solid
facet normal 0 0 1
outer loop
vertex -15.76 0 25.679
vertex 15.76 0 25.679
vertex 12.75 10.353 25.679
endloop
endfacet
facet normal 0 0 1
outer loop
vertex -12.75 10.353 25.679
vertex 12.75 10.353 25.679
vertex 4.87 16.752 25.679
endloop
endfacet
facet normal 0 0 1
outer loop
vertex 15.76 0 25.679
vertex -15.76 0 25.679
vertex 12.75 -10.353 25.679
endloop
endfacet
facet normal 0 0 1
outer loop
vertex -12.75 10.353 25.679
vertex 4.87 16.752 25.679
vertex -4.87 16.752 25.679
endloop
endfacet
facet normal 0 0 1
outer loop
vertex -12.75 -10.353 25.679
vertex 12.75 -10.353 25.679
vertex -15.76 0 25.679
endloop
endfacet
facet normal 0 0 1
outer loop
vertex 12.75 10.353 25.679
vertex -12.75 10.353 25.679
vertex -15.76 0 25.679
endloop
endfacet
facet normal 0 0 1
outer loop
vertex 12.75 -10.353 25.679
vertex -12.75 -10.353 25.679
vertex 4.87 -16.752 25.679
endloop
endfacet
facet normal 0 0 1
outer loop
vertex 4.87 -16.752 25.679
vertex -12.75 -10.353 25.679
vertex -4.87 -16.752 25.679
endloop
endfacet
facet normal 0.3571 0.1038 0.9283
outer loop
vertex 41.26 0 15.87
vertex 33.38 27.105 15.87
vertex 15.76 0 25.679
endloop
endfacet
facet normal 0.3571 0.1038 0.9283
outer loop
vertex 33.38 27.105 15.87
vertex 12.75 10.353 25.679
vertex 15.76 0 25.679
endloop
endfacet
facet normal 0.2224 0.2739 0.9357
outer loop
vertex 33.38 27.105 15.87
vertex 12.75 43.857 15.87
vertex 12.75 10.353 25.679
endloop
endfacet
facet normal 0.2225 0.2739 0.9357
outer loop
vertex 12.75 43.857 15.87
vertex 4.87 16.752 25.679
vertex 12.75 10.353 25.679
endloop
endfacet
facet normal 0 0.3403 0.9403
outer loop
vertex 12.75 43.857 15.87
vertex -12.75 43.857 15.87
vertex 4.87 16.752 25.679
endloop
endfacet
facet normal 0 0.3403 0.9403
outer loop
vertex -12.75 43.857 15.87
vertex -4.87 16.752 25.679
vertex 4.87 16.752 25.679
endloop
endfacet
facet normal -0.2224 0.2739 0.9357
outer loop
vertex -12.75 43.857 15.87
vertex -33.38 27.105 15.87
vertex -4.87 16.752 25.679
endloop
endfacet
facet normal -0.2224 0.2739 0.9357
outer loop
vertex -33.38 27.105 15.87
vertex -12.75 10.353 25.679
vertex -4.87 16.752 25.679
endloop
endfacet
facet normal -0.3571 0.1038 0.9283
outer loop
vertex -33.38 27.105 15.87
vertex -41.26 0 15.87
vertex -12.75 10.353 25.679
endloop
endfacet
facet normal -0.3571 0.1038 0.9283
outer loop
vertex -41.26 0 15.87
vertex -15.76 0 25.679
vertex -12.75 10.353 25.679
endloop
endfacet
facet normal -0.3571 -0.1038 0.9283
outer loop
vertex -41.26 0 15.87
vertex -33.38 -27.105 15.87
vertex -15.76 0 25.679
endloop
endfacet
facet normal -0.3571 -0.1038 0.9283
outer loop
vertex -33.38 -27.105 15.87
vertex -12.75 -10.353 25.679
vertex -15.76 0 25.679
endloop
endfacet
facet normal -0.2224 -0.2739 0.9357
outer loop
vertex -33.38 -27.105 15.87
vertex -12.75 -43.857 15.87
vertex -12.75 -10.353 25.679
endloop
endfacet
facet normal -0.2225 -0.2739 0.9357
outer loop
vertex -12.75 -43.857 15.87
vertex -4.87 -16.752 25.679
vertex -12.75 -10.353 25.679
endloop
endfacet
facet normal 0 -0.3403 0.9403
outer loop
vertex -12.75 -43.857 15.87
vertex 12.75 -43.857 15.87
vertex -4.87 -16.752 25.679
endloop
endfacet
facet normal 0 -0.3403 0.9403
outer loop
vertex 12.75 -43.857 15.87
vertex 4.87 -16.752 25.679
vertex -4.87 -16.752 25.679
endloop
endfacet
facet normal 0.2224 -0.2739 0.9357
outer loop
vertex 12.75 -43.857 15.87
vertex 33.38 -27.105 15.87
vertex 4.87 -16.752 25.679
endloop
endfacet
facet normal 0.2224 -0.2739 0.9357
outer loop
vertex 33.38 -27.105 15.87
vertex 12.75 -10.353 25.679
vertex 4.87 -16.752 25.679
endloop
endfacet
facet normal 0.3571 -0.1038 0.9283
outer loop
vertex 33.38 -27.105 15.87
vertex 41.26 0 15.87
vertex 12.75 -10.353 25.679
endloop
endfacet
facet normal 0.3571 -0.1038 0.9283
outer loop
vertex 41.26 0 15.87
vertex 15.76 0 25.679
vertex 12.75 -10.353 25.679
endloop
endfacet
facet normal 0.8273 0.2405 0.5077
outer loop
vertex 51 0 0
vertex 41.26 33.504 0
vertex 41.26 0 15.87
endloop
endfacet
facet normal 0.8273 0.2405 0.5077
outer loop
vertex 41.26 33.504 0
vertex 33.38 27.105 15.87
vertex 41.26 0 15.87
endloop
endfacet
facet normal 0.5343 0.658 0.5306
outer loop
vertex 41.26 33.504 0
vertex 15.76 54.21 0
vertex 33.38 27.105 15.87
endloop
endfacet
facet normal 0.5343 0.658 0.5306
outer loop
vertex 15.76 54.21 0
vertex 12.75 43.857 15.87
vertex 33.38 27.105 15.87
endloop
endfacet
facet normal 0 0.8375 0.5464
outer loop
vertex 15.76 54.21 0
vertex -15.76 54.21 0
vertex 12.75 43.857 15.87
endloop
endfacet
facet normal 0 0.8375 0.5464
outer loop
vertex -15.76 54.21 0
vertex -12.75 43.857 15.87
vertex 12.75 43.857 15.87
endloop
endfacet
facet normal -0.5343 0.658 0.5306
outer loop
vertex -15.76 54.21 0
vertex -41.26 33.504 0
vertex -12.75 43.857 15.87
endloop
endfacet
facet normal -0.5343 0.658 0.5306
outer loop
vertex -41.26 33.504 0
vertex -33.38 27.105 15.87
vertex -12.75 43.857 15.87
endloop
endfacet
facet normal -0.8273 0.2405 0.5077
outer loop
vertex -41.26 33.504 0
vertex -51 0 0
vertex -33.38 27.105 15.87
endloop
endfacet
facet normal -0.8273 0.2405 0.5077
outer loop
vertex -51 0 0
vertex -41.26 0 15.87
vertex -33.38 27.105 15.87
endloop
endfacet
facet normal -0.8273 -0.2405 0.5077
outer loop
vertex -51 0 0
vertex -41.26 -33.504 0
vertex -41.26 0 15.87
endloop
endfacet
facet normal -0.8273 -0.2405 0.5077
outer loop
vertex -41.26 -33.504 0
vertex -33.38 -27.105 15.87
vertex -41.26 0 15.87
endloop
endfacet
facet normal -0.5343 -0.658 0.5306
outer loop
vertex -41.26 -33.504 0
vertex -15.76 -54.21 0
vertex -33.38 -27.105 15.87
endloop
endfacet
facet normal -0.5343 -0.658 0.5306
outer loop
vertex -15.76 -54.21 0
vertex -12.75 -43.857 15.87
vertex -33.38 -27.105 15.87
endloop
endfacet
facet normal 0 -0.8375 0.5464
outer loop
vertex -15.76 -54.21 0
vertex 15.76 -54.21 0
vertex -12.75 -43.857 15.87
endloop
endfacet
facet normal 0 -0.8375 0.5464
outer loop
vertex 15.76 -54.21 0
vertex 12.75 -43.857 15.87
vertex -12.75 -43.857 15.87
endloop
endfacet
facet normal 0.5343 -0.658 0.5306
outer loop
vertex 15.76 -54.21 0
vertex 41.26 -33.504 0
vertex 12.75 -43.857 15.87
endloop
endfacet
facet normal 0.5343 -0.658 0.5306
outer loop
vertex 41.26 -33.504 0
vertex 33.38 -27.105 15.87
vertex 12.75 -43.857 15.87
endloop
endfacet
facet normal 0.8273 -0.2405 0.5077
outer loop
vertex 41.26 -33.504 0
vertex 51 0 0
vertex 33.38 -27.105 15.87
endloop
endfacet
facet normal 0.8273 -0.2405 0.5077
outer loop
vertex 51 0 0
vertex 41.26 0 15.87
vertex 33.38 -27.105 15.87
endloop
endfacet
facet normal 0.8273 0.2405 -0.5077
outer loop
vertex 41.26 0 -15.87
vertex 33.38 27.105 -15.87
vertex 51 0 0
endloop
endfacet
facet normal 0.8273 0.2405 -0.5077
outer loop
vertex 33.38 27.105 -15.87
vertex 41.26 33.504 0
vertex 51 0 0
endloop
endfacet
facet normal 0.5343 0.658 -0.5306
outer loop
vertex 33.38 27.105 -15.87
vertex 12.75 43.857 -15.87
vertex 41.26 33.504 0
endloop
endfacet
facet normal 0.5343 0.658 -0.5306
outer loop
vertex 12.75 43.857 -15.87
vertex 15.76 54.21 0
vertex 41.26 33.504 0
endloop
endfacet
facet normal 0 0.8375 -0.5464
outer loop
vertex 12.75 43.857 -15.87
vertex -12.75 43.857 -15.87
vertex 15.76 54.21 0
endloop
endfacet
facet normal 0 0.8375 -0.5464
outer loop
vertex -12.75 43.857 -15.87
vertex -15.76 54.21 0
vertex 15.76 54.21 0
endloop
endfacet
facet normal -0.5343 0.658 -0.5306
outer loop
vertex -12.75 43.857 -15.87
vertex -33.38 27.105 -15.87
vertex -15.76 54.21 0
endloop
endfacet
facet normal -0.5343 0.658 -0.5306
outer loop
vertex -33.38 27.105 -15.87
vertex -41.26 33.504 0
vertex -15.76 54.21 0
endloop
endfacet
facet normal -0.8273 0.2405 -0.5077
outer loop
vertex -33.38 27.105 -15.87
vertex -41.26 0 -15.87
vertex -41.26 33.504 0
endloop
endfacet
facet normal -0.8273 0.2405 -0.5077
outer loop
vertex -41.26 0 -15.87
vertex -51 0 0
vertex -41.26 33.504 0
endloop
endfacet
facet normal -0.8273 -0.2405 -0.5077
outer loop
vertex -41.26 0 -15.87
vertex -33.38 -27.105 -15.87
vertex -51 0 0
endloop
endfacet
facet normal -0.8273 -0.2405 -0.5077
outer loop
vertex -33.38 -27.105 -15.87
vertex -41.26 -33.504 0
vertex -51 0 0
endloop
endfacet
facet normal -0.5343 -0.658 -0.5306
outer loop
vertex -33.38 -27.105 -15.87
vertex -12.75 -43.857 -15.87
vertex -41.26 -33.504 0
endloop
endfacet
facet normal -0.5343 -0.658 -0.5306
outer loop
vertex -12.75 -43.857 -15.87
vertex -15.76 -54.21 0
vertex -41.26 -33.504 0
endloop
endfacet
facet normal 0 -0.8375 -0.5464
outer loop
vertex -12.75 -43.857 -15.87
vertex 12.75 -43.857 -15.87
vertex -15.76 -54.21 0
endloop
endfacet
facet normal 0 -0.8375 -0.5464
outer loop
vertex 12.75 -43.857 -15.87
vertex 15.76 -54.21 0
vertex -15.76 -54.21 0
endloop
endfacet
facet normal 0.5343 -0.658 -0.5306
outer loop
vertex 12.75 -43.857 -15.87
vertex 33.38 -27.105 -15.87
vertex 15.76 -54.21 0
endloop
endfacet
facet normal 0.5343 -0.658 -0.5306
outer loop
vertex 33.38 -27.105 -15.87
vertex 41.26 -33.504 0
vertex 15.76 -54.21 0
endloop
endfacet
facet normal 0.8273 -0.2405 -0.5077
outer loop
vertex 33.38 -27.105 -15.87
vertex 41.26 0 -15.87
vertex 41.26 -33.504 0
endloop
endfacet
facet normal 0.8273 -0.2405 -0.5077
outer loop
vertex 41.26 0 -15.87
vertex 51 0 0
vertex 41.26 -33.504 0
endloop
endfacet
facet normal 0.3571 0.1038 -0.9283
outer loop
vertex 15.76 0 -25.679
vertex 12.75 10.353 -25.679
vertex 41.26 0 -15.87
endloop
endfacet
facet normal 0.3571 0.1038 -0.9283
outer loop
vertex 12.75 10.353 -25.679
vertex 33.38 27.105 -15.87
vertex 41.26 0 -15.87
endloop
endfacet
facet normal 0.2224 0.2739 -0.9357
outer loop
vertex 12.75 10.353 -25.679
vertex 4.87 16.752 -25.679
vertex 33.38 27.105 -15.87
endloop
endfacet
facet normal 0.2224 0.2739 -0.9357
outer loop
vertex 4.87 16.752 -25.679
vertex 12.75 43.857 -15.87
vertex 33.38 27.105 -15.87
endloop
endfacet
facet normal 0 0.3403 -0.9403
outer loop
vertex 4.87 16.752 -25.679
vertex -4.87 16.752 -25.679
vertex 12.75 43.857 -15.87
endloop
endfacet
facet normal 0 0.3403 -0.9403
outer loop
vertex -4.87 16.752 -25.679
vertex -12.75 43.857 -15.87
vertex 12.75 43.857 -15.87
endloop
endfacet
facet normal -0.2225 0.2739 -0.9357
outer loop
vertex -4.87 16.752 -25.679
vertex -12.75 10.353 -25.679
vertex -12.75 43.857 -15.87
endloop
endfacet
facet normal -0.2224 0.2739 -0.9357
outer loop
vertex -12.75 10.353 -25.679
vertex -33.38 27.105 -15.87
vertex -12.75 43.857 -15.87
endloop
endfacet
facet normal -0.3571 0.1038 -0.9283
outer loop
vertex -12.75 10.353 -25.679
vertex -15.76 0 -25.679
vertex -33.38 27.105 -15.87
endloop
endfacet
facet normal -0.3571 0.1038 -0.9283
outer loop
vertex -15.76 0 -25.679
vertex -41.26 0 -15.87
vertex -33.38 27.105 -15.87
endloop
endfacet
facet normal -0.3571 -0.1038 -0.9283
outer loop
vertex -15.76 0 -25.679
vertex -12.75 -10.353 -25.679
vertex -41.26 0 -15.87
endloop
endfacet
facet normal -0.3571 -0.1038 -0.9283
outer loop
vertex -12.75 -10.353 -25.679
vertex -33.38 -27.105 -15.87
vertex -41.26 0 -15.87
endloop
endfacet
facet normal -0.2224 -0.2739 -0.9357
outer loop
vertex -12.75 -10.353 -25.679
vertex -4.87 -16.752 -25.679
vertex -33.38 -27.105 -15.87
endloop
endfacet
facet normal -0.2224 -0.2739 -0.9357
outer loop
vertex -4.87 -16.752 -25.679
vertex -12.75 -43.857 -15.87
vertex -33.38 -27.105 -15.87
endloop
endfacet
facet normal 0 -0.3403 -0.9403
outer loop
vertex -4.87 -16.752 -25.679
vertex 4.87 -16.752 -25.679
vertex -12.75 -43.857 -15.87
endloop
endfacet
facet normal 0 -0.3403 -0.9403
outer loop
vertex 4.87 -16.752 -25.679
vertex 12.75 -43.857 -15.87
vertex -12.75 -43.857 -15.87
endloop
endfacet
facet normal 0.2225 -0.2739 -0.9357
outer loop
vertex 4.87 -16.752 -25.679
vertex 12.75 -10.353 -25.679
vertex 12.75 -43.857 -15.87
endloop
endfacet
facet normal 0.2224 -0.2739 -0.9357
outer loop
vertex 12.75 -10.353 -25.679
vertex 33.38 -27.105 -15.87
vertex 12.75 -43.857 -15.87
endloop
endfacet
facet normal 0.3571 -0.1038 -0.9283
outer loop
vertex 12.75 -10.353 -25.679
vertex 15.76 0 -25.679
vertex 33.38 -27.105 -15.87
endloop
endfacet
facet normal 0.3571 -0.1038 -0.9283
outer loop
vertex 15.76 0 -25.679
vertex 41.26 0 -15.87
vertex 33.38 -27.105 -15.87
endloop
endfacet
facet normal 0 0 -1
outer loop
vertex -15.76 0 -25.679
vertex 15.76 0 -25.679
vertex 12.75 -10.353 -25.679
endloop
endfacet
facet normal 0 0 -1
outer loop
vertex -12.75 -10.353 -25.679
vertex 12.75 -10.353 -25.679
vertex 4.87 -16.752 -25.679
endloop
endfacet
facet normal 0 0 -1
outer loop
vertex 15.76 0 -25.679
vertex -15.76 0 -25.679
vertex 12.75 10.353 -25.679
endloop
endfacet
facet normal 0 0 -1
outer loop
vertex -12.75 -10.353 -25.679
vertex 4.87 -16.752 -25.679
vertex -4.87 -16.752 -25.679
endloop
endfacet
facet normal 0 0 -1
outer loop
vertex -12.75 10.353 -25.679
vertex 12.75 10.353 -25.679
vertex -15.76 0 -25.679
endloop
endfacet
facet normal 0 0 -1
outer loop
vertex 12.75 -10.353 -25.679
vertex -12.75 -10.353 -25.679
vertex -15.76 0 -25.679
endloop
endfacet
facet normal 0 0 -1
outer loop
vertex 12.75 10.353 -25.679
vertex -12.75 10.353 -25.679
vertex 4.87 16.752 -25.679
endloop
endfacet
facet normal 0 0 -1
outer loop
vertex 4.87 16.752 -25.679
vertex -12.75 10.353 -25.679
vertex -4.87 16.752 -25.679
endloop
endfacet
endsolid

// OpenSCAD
// Generated by SolidPython 1.0.1 on 2020-07-29 00:46:53


scale(v = [17, 19, 9]) {
	sphere(r = 3);
}
/***********************************************
*********      SolidPython code:      **********
************************************************
 
# import packages: SolidPython
from solid import *
from solid.utils import *
from itertools import chain, combinations, permutations


class Resize:

    def __init__(self, scad_file):
        self.scad_file = scad_file
        #self.scad_file = import_scad(scad_file)
        # cone/cylinder param:
        self.r1 = 0
        self.r2 = 0
        self.h = 0
        # rectangular prism param:
        self.w = 0
        self.l = 0
        # ellipse param:
        self.r = 0

    # import OpenScad code (file name corresponds to shape)


    # classify shape + parameters
    def assign(self, param1, param2, param3):
        if self.scad_file == 'cone.scad':
            self.r1 = param1
            self.r2 = param2
            self.h = param3
        elif self.scad_file == 'cylinder.scad':
            self.r1 = param1
            self.r2 = param2
            self.h = param3
        elif self.scad_file == 'rectangularPrism.scad':
            self.h = param1
            self.l = param2
            self.w = param3
        else:
            self.r = param1
            self.h = param2

    # resize parameters
    def iterate(self):
        x = range(3, 20, 2)
        i = 1
        if self.scad_file == 'cone.scad':
            tempList = list(permutations(x, 2))
            for temp in tempList:
                param1 = temp[0]
                param2 = temp[1]
                filepath = 'produced_scad_files/' + 'cone' + str(param1) + '_' + str(param2) + '_' + '.scad'
                scad_render_to_file(cylinder(h=param1, r1=param2, r2=0), filepath)

        elif self.scad_file == 'cylinder.scad':
            tempList = list(permutations(x, 3))
            for temp in tempList:
                param1 = temp[0]
                param2 = temp[1]
                filepath = 'produced_scad_files/' + 'cylinder' + str(param1) + '_' + str(param2) + '_' + '.scad'
                scad_render_to_file(cylinder(h=param1, r1=param2, r2=param2), filepath)

        elif self.scad_file == 'rectangularPrism.scad':
            tempList = list(permutations(x, 3))
            for temp in tempList:
                param1 = temp[0]
                param2 = temp[1]
                param3 = temp[2]
                filepath = 'produced_scad_files/' + 'rectangularPrism' + str(param1) + '_' + str(param2) + '_' + str(
                    param3) + '.scad'
                scad_render_to_file(cube(size=(param1, param2, param3)), filepath)

        elif self.scad_file == 'ellipse.scad':
            tempList = list(permutations(x, 4))
            for temp in tempList:
                param1 = temp[0]
                param2 = temp[1]
                param3 = temp[2]
                param4 = temp[3]
                filepath = 'produced_scad_files/' + 'ellipse' + str(param1) + '_' + str(param2) + '_' + str(param3) + '_' + str(param4) + '.scad'
                scad_render_to_file(scale([param1, param2, param3])(sphere(r=param4)), filepath)

    def render_to_scadfile(self):
        scad_render_to_file(scad, 'example.scad') 
 
************************************************/
